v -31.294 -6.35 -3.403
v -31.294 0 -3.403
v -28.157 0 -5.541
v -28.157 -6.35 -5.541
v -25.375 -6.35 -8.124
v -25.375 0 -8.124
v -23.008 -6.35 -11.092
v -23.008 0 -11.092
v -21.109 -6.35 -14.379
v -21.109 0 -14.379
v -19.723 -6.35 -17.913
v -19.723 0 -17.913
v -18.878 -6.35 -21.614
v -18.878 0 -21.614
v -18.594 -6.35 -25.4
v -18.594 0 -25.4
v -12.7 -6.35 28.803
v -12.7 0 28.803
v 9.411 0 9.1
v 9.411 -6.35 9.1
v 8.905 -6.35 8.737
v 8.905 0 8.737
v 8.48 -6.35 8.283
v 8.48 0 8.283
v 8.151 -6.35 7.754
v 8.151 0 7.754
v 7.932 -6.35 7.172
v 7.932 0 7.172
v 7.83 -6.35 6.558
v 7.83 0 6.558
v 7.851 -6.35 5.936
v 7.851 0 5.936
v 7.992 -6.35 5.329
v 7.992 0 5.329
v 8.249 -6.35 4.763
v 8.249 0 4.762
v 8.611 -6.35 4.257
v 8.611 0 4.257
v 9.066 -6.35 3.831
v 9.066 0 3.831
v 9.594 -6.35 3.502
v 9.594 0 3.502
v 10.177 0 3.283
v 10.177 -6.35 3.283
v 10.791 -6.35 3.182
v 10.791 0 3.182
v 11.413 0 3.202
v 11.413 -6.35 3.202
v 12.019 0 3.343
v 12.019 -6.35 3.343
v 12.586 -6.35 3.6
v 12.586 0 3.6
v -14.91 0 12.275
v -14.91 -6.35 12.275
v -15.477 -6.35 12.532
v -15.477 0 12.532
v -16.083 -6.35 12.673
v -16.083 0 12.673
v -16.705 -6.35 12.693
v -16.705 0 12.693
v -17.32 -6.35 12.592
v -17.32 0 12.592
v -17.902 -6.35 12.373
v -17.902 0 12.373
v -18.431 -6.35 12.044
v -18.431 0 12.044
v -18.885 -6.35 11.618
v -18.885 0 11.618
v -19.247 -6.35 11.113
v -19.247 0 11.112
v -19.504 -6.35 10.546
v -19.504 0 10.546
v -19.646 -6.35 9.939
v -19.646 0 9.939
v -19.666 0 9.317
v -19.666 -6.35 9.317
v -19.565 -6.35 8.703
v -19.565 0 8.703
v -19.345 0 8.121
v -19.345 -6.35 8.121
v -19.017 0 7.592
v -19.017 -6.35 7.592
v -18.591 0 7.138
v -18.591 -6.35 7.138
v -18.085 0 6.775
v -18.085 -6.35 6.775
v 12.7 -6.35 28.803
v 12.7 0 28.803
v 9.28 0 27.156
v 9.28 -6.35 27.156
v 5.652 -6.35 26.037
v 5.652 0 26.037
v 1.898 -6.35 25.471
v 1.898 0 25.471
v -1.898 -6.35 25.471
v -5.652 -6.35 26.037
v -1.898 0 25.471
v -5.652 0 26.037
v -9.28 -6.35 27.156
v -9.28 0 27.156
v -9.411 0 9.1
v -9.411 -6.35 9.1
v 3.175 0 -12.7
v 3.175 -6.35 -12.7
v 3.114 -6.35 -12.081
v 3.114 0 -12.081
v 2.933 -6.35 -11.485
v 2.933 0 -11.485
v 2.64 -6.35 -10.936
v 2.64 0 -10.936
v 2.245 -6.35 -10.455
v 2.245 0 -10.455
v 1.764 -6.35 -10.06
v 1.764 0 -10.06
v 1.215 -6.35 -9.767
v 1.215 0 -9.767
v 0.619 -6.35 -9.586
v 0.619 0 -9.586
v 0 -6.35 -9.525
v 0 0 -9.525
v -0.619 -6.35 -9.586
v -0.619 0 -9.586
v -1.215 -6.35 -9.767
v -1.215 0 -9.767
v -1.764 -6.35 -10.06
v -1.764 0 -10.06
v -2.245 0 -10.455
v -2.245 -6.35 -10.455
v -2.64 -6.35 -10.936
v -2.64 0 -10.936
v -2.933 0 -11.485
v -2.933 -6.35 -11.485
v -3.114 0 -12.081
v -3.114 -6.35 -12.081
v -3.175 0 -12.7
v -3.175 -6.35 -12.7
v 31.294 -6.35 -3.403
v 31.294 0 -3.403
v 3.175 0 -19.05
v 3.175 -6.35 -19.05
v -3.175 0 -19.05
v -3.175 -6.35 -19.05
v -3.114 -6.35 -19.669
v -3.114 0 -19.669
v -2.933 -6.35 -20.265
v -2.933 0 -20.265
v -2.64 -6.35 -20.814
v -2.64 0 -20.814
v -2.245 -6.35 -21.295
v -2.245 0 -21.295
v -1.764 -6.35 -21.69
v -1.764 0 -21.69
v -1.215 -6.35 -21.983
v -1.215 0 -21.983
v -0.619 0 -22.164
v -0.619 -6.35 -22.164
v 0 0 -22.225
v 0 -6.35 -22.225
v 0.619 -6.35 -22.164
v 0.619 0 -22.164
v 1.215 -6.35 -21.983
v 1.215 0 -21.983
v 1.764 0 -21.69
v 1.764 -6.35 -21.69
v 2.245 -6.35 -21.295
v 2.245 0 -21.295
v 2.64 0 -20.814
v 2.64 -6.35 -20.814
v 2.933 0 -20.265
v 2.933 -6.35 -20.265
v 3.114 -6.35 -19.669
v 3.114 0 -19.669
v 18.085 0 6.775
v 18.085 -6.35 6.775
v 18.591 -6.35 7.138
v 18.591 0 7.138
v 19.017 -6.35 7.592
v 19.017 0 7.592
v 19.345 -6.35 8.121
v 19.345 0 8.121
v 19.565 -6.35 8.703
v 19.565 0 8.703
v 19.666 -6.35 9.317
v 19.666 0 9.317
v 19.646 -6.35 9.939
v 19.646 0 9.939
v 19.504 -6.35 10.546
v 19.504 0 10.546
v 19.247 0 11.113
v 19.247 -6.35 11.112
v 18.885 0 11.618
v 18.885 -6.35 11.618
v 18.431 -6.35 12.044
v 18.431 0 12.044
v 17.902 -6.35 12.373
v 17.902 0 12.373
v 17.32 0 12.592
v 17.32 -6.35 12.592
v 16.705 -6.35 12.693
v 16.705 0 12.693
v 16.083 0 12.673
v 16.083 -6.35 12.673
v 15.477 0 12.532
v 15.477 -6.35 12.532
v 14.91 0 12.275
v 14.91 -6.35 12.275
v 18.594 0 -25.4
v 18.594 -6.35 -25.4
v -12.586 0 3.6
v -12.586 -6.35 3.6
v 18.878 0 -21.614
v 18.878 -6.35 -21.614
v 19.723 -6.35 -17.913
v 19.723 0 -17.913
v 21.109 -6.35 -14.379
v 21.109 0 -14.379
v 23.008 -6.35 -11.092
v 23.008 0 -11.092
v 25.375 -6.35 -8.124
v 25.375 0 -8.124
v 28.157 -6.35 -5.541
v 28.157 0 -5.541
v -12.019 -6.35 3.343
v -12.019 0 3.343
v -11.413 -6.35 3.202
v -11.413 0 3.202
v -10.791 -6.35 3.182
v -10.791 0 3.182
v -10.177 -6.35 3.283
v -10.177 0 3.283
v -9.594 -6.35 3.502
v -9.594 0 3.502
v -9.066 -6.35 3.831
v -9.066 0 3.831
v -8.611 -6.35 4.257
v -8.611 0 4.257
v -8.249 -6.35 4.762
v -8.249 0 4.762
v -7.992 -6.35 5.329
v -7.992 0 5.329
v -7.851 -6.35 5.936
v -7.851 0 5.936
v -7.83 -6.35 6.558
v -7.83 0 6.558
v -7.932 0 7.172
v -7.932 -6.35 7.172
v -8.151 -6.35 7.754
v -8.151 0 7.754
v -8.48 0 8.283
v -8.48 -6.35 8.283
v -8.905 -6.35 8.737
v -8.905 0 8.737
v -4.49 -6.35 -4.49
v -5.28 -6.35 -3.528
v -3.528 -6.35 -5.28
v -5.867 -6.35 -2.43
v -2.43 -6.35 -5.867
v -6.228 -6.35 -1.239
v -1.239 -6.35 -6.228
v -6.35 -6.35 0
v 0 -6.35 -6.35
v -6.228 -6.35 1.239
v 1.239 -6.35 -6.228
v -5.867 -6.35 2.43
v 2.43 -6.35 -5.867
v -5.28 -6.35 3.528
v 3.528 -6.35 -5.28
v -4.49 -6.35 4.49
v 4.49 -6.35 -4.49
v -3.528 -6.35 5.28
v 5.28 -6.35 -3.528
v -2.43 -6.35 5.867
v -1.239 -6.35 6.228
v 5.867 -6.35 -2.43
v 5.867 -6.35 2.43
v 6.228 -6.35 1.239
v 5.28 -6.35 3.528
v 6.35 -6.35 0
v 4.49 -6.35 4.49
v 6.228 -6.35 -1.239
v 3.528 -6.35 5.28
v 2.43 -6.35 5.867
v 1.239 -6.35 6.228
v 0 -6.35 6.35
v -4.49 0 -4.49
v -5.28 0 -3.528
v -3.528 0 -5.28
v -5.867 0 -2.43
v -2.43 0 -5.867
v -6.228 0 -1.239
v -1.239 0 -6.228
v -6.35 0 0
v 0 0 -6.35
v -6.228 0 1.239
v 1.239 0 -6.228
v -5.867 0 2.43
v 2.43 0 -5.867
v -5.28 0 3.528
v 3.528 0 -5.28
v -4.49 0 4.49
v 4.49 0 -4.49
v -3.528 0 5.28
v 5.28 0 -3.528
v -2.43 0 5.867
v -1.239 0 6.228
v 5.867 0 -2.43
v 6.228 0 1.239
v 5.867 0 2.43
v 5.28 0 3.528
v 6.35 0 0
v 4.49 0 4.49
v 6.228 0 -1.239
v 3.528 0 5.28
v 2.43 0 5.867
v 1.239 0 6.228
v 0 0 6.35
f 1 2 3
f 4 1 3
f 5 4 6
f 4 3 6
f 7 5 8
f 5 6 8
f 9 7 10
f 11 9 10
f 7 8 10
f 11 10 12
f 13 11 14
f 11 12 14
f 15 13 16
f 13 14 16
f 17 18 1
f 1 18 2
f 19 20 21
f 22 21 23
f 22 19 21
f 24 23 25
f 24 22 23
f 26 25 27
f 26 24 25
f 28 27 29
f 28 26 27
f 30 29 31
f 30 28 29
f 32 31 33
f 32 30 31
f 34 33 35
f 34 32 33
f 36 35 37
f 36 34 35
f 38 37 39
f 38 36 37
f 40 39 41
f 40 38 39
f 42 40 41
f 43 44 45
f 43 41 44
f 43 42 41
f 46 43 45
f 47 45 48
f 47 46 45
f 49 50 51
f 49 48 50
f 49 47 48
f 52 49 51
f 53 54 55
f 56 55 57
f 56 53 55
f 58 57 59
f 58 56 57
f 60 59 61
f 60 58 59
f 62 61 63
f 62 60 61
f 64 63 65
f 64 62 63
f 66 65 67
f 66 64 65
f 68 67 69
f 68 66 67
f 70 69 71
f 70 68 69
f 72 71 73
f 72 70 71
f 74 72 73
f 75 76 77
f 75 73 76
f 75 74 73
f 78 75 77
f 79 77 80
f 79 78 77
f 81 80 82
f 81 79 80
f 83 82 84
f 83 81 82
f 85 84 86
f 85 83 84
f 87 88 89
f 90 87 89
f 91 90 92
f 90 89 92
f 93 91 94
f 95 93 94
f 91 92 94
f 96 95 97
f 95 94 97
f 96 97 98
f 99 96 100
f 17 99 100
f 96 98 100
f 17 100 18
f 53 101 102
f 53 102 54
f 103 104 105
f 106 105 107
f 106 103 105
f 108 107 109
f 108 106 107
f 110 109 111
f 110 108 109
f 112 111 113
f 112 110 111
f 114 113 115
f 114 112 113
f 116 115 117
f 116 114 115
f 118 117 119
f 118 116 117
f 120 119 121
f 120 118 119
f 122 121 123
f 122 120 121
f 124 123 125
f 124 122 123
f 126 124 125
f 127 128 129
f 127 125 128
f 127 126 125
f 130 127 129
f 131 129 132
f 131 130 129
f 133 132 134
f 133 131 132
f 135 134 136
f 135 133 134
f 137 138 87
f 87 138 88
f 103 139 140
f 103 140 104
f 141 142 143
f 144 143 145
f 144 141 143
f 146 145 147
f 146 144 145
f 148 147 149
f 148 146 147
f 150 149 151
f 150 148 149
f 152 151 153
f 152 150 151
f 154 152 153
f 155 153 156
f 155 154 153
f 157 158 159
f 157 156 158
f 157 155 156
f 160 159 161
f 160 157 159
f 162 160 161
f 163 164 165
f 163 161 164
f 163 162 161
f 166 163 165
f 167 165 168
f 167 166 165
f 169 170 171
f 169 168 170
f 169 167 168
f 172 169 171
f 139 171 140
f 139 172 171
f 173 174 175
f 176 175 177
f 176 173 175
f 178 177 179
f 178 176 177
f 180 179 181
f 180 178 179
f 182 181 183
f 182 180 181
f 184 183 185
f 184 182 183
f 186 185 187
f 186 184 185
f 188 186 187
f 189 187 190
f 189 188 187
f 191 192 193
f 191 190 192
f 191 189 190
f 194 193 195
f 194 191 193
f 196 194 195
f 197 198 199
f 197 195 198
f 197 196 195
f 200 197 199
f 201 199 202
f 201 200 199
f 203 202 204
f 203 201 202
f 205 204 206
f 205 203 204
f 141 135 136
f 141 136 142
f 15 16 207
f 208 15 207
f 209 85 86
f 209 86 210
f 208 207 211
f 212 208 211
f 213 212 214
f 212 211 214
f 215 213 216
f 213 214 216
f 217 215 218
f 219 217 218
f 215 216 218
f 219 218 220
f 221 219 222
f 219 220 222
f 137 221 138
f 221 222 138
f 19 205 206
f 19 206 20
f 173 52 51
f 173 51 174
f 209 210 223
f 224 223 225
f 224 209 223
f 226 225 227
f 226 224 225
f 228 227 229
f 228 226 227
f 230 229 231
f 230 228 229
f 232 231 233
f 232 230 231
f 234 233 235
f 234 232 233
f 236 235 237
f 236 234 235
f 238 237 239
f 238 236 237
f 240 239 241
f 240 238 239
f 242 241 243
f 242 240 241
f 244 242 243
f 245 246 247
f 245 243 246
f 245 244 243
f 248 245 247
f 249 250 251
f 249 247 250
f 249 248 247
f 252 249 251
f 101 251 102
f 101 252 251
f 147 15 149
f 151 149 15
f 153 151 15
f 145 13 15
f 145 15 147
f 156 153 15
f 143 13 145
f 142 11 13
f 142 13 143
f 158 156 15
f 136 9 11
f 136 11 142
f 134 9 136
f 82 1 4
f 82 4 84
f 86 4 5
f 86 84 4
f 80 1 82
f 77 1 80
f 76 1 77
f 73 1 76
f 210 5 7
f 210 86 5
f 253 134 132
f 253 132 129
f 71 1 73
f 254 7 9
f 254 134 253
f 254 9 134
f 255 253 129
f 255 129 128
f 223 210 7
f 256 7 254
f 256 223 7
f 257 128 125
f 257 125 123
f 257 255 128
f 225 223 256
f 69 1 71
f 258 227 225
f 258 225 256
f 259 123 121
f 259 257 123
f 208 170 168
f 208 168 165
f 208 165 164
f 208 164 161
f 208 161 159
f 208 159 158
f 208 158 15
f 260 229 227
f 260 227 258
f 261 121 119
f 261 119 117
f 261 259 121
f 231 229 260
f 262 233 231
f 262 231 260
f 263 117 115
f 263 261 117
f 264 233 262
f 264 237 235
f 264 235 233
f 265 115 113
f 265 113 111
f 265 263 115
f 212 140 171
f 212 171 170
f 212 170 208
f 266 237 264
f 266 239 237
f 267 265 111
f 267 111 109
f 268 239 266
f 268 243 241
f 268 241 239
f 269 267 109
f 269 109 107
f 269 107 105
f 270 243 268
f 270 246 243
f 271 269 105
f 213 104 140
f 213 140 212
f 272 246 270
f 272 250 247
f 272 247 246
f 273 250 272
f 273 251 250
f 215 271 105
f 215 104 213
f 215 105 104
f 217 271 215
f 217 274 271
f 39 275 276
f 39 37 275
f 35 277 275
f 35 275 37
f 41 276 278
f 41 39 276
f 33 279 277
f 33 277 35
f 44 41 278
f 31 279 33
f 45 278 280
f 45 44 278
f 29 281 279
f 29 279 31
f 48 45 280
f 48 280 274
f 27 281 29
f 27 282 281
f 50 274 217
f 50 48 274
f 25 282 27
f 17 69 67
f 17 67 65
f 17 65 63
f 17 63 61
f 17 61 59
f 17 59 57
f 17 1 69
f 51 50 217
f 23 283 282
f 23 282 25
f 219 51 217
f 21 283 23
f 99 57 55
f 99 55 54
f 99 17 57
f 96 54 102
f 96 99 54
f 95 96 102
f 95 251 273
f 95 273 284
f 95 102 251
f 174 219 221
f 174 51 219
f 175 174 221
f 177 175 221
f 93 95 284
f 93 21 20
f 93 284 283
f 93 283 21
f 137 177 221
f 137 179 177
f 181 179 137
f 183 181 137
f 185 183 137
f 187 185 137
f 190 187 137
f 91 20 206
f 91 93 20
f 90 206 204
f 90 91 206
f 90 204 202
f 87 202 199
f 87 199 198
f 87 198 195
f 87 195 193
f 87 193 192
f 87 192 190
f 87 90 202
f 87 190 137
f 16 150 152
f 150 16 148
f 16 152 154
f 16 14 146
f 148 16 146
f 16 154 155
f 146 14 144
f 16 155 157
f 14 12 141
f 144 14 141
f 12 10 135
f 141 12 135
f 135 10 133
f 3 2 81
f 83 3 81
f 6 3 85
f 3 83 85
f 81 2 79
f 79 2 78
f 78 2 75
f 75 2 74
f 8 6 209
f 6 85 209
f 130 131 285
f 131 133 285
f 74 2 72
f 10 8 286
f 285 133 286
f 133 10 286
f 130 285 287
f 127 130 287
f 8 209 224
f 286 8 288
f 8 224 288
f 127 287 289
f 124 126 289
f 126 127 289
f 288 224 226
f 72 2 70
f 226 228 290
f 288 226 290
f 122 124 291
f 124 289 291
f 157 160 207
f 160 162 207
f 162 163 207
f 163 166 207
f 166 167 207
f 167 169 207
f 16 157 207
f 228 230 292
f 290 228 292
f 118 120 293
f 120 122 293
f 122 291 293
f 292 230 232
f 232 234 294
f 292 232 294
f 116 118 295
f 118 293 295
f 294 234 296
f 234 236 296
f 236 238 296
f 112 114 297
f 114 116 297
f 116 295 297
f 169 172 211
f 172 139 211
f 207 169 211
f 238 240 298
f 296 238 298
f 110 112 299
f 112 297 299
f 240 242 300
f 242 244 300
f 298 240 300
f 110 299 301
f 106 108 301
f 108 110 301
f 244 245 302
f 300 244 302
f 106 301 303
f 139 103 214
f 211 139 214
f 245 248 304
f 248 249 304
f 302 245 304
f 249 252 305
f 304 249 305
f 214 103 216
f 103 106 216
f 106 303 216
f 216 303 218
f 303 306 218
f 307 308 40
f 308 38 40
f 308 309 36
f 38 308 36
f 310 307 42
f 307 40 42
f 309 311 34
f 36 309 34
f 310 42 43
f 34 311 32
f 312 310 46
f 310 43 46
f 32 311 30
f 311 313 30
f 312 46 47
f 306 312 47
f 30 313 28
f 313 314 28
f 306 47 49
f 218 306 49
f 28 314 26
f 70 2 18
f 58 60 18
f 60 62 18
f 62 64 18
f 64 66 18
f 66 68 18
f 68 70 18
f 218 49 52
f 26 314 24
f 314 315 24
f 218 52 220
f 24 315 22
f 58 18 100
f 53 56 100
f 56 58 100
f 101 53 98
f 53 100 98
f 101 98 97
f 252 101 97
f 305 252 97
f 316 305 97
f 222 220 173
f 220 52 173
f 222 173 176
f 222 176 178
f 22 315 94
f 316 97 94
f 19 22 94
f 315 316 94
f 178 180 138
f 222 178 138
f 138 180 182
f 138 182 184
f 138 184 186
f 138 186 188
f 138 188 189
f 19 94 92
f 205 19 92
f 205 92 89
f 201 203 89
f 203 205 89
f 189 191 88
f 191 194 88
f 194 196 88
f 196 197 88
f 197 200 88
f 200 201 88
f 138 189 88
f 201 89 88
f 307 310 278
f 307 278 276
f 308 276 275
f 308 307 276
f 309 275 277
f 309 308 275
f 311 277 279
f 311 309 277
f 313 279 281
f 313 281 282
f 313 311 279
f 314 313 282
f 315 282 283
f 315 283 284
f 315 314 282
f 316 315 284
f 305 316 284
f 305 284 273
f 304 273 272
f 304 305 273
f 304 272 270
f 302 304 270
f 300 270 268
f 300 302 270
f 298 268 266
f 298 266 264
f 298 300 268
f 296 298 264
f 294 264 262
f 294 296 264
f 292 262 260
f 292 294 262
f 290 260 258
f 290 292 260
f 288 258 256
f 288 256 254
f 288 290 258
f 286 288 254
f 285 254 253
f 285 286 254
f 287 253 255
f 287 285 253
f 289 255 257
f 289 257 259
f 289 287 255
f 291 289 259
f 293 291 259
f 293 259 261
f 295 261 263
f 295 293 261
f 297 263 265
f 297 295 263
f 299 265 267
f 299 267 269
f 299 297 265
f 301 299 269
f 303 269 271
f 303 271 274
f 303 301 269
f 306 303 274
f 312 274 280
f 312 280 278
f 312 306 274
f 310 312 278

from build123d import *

# Parameters (mm, degrees)
F0_R     = 6.35
F1_DEPTH = 6.35
F3_DEPTH = 25.4


with BuildPart() as f1:
    # F0 (on Front) → F1 (new body)
    with BuildSketch(Plane.XZ):
        with BuildLine():
            Line((-18.594091, -25.4), (18.594091, -25.4))
            ThreePointArc((18.594091, -25.4), (21.997045, -12.7), (31.294091, -3.402955))
            Line((31.294091, -3.402955), (12.7, 28.802955))
            ThreePointArc((12.7, 28.802955), (0, 25.4), (-12.7, 28.802955))
            Line((-12.7, 28.802955), (-31.294091, -3.402955))
            ThreePointArc((-31.294091, -3.402955), (-21.997045, -12.7), (-18.594091, -25.4))
        make_face()
        Circle(F0_R, mode=Mode.SUBTRACT)
    extrude(amount=F1_DEPTH)

    # F2 (on Front) → F3 (cut)
    with BuildSketch(Plane.XZ):
        with BuildLine():
            Line((-3.175, -12.7), (-3.175, -19.05))
            ThreePointArc((-3.175, -19.05), (0, -22.225), (3.175, -19.05))
            Line((3.175, -19.05), (3.175, -12.7))
            ThreePointArc((3.175, -12.7), (0, -9.525), (-3.175, -12.7))
        make_face()
        with BuildLine():
            Line((-18.085284, 6.775369), (-12.586023, 3.600369))
            ThreePointArc((-12.586023, 3.600369), (-8.248892, 4.7625), (-9.411023, 9.099631))
            Line((-9.411023, 9.099631), (-14.910284, 12.274631))
            ThreePointArc((-14.910284, 12.274631), (-19.247415, 11.1125), (-18.085284, 6.775369))
        make_face()
        with BuildLine():
            Line((14.910284, 12.274631), (9.411023, 9.099631))
            ThreePointArc((9.411023, 9.099631), (8.248892, 4.7625), (12.586023, 3.600369))
            Line((12.586023, 3.600369), (18.085284, 6.775369))
            ThreePointArc((18.085284, 6.775369), (19.247415, 11.1125), (14.910284, 12.274631))
        make_face()
    extrude(amount=F3_DEPTH, mode=Mode.SUBTRACT)


solid = f1.part
